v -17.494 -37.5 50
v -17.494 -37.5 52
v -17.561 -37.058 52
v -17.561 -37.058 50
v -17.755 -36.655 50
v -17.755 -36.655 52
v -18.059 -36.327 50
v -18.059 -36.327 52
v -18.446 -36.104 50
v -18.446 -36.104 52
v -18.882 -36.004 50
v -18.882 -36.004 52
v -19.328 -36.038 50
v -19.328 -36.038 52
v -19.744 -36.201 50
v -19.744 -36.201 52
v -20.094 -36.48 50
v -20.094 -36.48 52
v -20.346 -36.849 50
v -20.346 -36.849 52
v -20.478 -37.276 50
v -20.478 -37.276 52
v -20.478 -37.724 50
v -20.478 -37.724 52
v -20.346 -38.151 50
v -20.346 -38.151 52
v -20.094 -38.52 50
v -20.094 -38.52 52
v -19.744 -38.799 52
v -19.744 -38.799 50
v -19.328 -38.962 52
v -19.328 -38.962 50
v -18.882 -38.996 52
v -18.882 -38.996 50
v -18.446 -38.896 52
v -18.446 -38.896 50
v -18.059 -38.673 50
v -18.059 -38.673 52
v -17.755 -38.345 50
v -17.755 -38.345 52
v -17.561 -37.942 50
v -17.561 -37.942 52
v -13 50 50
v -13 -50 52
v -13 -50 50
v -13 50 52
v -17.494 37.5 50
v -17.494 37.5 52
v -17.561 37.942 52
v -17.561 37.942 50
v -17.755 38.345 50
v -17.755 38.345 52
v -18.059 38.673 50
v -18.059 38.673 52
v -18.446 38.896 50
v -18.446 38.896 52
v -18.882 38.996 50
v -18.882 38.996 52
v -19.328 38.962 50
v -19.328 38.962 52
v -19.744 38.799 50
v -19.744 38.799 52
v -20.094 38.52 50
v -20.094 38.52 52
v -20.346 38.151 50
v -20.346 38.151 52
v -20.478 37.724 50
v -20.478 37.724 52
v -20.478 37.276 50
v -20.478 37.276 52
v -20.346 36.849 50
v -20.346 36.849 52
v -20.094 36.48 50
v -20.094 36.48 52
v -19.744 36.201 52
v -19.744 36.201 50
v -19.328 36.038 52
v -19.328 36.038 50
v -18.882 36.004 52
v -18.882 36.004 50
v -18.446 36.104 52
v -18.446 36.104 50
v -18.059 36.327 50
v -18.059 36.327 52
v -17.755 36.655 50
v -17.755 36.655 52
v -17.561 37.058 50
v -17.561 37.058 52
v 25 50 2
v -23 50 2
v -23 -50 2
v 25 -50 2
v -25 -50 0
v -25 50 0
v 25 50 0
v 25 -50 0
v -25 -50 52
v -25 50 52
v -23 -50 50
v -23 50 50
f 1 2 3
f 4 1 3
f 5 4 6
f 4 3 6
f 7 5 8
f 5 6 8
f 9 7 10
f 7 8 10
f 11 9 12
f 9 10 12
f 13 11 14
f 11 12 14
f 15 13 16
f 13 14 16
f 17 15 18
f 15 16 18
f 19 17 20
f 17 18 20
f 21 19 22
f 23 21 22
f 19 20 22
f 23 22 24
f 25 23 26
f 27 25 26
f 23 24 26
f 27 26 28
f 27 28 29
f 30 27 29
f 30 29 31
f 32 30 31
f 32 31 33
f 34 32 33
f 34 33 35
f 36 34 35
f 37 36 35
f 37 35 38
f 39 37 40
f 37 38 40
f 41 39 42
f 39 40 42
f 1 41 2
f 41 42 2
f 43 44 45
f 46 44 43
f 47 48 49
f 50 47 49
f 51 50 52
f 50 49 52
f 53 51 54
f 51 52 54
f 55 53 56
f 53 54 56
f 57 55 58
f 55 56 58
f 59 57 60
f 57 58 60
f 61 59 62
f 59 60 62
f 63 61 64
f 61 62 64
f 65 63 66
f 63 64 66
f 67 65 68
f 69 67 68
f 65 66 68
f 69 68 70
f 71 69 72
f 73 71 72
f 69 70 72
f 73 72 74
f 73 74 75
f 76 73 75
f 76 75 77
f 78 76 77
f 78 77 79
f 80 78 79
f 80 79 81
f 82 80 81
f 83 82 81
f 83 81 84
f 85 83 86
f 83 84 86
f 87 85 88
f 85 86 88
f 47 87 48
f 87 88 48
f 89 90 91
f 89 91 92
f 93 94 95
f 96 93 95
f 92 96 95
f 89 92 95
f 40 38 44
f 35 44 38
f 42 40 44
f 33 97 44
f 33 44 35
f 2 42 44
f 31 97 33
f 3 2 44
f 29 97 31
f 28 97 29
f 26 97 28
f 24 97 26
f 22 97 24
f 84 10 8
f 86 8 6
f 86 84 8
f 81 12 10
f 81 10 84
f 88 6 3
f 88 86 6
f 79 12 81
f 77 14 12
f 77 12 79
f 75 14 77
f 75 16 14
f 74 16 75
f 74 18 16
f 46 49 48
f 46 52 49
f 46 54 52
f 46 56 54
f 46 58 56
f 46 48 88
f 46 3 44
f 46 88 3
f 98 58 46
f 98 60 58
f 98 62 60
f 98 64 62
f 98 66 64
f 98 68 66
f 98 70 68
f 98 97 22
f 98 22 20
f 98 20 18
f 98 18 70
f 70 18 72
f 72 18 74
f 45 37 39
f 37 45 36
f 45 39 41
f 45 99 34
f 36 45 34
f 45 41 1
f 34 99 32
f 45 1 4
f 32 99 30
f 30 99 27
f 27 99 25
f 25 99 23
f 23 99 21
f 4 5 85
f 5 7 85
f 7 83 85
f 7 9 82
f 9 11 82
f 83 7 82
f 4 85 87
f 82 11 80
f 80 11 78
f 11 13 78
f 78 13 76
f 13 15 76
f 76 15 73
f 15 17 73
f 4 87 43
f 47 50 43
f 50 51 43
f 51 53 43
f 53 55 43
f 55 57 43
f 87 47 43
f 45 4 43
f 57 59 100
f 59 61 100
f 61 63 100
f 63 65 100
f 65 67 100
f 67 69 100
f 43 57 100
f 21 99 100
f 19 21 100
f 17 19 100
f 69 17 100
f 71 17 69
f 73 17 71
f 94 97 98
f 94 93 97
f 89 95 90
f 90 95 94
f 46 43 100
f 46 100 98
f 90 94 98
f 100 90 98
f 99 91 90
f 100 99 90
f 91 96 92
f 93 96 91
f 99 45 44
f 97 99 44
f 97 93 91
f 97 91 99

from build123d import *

# Parameters (mm, degrees)
F0_W     = 50
F0_H     = 100
F1_DEPTH = 2
F2_W     = 2
F2_H     = 100
F3_DEPTH = 50
F4_W     = 100
F4_H     = 2
F5_DEPTH = 10
F6_R     = 1.5
F7_DEPTH = 2


with BuildPart() as f1:
    # F0 (on Top) → F1 (new body)
    with BuildSketch(Plane.XY):
        Rectangle(F0_W, F0_H)
    extrude(amount=F1_DEPTH)

    # F2 (on face) → F3 (join)
    with BuildSketch(Plane.XY.offset(2)):
        with Locations((-24, 0)):
            Rectangle(F2_W, F2_H)
    extrude(amount=F3_DEPTH)

    # F4 (on face) → F5 (join)
    with BuildSketch(Plane.YZ.offset(-23)):
        with Locations((0, 51)):
            Rectangle(F4_W, F4_H)
    extrude(amount=F5_DEPTH)

    # F6 (on face) → F7 (cut, through all)
    with BuildSketch(Plane.XY.offset(52)):
        with Locations((-18.9944, 37.5)):
            Circle(F6_R)
        with Locations((-18.9944, -37.5)):
            Circle(F6_R)
    extrude(amount=-F7_DEPTH, mode=Mode.SUBTRACT)


solid = f1.part
